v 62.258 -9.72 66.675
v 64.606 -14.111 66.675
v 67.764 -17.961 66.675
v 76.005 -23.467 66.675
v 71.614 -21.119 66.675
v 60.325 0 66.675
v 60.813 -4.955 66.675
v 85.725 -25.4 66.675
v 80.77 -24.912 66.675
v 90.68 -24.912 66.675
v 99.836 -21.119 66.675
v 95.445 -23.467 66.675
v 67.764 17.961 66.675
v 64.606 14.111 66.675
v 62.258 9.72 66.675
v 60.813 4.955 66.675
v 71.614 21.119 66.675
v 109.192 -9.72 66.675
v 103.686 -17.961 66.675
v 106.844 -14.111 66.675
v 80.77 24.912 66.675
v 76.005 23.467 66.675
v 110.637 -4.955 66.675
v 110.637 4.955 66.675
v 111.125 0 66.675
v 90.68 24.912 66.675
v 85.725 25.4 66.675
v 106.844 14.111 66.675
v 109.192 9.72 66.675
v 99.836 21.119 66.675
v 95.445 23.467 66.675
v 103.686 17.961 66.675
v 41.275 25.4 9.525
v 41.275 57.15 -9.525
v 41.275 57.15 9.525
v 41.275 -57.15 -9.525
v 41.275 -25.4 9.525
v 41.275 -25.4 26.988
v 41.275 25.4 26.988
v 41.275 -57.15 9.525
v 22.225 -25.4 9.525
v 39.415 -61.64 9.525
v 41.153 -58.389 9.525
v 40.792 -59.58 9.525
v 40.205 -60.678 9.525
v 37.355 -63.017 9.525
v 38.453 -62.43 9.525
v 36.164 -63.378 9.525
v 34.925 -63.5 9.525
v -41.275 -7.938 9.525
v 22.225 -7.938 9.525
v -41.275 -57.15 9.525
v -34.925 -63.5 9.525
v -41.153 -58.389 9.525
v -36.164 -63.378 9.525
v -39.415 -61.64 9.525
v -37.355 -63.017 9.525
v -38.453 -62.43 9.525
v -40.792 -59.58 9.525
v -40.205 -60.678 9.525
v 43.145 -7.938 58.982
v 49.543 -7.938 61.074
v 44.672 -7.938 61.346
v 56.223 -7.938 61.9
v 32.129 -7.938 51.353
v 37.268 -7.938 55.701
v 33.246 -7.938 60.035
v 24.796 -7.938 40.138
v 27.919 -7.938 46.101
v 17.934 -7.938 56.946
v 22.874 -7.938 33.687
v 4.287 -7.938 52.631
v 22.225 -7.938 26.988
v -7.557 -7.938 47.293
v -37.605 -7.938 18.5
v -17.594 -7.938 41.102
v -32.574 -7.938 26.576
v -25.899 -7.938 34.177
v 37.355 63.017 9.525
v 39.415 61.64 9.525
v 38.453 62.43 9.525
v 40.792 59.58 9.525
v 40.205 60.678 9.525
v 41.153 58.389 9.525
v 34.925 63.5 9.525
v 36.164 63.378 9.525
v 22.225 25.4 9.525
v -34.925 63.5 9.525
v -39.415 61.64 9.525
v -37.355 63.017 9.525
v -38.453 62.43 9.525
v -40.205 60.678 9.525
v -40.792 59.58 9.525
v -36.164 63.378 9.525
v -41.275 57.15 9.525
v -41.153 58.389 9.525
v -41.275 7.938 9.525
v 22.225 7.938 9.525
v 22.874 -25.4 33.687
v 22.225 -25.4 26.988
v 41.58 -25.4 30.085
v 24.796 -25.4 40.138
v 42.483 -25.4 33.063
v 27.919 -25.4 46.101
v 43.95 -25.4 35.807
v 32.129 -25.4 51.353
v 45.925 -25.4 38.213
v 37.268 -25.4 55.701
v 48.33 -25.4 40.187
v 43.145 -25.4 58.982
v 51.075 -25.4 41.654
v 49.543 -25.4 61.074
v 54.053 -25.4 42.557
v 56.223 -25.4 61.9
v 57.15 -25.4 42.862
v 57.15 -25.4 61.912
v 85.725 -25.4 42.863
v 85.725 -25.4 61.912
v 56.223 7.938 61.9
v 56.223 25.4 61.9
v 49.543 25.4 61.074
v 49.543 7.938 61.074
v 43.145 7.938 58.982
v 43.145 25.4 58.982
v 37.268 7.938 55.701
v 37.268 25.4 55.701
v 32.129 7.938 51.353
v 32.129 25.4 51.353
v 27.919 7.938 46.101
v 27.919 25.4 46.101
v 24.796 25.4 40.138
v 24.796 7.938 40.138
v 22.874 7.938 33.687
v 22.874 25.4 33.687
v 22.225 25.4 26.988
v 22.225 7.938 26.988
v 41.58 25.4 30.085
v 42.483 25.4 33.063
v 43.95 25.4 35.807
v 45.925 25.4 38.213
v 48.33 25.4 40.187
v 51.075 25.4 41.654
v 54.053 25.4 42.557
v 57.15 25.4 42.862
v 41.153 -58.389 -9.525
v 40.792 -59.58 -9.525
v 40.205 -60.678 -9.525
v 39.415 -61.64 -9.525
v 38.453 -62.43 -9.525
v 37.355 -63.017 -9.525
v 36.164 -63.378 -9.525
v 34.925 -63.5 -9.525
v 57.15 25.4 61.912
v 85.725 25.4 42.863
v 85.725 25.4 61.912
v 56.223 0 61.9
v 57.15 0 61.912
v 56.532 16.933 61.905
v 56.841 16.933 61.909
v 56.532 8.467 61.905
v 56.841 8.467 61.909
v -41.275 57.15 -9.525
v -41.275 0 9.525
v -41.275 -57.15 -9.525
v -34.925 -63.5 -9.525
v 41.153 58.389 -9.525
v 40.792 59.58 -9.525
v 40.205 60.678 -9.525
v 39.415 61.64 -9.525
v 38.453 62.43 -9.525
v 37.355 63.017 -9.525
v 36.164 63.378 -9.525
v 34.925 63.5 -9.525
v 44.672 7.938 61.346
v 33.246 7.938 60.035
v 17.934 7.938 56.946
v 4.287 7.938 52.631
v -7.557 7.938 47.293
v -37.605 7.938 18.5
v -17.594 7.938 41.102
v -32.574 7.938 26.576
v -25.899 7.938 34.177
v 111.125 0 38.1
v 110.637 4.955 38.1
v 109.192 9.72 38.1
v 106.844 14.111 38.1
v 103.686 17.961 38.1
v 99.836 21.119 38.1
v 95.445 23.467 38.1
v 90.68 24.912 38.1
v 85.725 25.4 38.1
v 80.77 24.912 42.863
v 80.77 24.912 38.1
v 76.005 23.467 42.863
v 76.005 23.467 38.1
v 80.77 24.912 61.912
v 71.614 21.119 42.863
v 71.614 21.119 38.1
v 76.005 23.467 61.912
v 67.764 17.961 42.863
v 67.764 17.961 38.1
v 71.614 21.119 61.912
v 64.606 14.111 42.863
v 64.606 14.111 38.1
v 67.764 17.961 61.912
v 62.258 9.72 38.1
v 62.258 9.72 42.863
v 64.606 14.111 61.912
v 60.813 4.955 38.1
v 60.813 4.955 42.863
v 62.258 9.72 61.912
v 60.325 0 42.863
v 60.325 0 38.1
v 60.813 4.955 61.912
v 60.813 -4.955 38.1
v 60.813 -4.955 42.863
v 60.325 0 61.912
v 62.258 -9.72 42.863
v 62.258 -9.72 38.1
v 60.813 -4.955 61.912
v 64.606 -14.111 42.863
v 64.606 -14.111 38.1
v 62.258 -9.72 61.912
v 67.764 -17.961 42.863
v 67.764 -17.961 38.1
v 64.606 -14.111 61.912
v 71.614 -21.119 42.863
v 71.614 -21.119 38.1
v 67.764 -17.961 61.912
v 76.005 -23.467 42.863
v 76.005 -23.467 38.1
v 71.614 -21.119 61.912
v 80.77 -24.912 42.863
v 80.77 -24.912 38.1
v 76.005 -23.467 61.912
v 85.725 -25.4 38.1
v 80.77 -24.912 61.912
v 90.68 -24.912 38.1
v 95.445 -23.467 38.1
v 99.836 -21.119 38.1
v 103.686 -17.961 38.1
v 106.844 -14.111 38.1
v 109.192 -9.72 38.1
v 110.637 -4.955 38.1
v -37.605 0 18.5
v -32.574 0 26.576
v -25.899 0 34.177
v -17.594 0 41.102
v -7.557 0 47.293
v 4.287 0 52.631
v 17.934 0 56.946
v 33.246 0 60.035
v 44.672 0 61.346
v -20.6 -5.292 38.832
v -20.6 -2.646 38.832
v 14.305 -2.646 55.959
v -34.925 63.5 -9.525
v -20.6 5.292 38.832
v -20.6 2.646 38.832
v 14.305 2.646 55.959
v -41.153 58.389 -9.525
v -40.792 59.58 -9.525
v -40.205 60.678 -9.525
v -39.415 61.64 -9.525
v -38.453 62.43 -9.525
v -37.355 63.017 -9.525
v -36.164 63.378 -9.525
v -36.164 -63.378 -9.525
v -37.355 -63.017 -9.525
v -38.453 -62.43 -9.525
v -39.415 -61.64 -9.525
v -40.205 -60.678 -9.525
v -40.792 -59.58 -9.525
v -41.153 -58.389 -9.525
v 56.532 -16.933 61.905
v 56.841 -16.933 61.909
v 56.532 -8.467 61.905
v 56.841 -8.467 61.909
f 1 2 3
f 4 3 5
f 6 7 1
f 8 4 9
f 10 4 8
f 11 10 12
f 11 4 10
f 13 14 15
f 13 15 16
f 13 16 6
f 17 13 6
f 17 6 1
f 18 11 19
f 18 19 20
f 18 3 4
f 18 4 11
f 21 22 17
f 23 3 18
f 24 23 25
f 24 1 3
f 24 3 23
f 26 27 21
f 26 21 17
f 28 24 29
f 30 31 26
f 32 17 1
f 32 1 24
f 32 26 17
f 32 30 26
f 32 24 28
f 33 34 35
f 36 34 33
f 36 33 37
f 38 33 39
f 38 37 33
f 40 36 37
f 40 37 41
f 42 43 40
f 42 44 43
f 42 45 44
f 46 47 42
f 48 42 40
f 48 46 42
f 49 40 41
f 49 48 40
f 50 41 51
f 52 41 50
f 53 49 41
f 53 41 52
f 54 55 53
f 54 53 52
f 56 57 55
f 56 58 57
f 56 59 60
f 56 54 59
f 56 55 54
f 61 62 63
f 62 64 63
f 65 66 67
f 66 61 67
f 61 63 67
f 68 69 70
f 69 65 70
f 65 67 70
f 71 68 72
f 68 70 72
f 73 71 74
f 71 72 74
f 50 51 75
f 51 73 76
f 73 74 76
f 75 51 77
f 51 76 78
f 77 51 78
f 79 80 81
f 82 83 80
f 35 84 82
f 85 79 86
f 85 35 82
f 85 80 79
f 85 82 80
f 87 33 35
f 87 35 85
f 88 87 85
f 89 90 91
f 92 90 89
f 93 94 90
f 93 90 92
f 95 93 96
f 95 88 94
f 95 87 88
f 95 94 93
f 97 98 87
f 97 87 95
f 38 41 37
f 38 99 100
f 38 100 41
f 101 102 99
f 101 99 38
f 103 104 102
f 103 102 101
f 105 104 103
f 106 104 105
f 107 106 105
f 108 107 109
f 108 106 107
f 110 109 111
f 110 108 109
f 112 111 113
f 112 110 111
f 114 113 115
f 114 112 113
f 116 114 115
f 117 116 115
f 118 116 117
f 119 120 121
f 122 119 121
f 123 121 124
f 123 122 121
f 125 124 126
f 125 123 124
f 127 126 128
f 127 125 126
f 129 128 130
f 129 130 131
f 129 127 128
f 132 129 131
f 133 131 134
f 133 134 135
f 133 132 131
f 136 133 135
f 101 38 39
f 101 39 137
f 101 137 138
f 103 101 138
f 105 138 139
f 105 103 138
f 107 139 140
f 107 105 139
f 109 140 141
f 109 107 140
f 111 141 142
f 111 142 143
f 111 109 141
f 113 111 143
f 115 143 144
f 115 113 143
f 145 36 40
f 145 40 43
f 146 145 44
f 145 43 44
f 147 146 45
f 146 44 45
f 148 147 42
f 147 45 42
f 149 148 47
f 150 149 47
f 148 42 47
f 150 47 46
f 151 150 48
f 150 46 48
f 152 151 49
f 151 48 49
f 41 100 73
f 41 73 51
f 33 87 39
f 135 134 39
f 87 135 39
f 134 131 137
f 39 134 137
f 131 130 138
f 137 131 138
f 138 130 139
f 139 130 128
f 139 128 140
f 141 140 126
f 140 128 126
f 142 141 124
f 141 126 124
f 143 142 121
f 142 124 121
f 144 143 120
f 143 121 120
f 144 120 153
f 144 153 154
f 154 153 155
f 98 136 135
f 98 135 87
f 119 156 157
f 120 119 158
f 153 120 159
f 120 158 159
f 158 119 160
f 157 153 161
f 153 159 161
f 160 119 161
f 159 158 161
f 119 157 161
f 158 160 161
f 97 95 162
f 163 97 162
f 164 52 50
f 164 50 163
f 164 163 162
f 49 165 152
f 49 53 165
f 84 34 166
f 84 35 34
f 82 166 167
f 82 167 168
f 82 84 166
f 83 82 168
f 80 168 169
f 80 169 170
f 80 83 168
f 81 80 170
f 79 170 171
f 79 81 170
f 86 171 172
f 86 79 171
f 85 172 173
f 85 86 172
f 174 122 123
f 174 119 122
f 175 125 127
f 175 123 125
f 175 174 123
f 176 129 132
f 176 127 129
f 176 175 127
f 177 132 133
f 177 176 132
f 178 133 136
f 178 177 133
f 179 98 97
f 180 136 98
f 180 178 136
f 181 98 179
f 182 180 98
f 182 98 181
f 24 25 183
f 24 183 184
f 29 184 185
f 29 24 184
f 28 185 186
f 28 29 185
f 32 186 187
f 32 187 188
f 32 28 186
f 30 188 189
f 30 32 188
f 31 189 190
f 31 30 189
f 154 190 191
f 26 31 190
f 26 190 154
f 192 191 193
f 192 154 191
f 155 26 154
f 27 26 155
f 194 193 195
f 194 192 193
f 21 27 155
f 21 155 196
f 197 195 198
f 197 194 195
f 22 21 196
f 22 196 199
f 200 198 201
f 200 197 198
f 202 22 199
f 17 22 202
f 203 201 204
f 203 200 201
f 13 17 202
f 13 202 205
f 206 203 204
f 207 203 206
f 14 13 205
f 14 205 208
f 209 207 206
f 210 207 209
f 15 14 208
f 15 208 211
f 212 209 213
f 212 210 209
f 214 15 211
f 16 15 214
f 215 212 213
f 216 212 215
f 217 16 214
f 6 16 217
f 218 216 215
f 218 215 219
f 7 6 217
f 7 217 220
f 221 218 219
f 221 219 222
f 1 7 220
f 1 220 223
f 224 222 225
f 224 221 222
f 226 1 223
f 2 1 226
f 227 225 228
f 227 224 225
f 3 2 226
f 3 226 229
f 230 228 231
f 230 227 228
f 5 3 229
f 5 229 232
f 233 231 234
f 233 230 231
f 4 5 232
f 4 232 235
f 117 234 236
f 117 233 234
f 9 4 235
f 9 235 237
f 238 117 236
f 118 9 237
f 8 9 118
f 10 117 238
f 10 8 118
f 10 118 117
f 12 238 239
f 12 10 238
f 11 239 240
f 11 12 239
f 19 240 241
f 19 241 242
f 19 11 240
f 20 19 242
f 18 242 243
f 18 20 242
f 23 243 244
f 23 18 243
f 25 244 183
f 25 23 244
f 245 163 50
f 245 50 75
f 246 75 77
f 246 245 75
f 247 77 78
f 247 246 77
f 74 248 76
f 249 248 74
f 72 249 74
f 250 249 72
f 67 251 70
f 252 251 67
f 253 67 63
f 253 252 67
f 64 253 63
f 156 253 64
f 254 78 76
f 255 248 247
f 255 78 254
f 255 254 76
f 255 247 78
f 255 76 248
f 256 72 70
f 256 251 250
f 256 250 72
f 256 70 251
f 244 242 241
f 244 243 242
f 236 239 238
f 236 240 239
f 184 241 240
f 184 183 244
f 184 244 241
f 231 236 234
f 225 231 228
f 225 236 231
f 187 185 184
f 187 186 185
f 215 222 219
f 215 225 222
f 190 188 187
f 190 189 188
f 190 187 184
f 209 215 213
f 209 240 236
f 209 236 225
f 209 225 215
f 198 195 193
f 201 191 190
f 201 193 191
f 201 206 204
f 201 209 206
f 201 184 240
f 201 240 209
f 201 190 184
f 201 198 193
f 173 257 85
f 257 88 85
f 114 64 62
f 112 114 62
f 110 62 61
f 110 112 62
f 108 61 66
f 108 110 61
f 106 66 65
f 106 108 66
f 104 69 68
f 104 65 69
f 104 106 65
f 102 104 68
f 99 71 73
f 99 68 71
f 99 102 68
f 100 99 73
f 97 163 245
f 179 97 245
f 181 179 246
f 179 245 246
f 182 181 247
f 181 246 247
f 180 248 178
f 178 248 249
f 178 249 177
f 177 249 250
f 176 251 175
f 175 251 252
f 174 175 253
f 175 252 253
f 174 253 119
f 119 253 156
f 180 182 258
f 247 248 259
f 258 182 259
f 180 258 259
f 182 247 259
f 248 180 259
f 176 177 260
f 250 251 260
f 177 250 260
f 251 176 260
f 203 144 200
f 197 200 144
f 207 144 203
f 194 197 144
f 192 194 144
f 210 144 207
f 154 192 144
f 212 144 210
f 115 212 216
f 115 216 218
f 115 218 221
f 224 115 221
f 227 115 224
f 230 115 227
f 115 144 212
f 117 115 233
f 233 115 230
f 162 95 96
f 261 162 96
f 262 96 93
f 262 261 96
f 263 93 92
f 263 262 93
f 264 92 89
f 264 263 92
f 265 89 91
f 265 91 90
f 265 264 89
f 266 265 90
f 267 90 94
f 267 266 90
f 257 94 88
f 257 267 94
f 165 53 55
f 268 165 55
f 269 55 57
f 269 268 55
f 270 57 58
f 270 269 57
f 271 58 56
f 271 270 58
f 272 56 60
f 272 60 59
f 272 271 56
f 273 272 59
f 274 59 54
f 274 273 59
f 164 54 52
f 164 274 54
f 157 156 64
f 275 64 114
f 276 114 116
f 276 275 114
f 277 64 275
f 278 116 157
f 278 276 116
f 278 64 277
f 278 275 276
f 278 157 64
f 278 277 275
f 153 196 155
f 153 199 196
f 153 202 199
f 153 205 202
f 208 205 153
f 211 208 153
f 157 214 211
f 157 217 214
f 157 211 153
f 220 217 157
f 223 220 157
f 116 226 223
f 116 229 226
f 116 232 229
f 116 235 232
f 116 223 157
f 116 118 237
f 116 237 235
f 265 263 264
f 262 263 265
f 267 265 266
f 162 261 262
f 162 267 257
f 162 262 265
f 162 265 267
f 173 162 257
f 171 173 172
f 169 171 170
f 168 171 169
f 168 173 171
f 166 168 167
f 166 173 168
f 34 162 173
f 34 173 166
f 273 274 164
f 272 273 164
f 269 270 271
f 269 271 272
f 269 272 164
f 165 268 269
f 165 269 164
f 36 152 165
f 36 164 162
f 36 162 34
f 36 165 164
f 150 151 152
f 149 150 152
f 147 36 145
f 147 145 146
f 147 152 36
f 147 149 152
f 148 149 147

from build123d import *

# Parameters (mm, degrees)
F1_DEPTH = 63.5
F0_W     = 25.4
F0_H     = 19.05
F2_DEPTH = 25.4
F3_DEPTH = 7.9375
F5_R     = 6.35


with BuildPart() as f1:
    # F0 (on Front) → F1 (new body, symmetric)
    with BuildSketch(Plane.XZ):
        Polygon((-41.275, -9.525), (41.275, -9.525), (41.275, 9.525), (22.225, 9.525), (-41.275, 9.525), align=None)
    extrude(amount=F1_DEPTH, both=True)



with BuildPart() as f2:
    # F0 (on Front) → F2 (new body, symmetric)
    with BuildSketch(Plane.XZ):
        with BuildLine():
            Line((22.225, 9.525), (41.275, 9.525))
            Line((41.275, 9.525), (41.275, 26.9875))
            ThreePointArc((41.275, 26.9875), (45.9246798487, 38.2128201513), (57.15, 42.8625))
            Line((57.15, 42.8625), (60.325, 42.8625))
            Line((60.325, 42.8625), (60.325, 61.9125))
            Line((60.325, 61.9125), (57.15, 61.9125))
            add(Edge.make_bspline(
                [(56.2230819512, 61.9001975172), (56.5320743429, 61.9050863843), (56.8410510368, 61.9091866589), (57.15, 61.9125)],
                knots=[110.7034248849, 110.7034248849, 110.7034248849, 110.7034248849, 111.4985685166, 111.4985685166, 111.4985685166, 111.4985685166], degree=3))
            ThreePointArc((56.2230819512, 61.9001975172), (32.1287266725, 51.3532855624), (22.225, 26.9875))
            Line((22.225, 26.9875), (22.225, 9.525))
        make_face()
        with Locations((73.025, 52.3875)):
            Rectangle(F0_W, F0_H)
    extrude(amount=F2_DEPTH, both=True)


with BuildPart() as f1_1:
    add(f1.part)

    add(f2.part)  # F3 merges F2
    # F0 (on Front) → F3 (join, symmetric)
    with BuildSketch(Plane.XZ):
        with BuildLine():
            add(Edge.make_bspline(
                [(-41.275, 9.525), (-30.1197790598, 45.2532624962), (13.2037900148, 61.219547757), (56.2230819512, 61.9001975172)],
                knots=[0, 0, 0, 0, 110.7034248849, 110.7034248849, 110.7034248849, 110.7034248849], degree=3))
            Line((-41.275, 9.525), (22.225, 9.525))
            Line((22.225, 9.525), (22.225, 26.9875))
            ThreePointArc((22.225, 26.9875), (32.1287266725, 51.3532855624), (56.2230819512, 61.9001975172))
        make_face()
    extrude(amount=F3_DEPTH, both=True)

    # F0 (on Front) → F4 (revolve)
    with BuildSketch(Plane.XZ):
        Polygon((85.725, 61.9125), (85.725, 42.8625), (85.725, 38.1), (111.125, 38.1), (111.125, 66.675), (85.725, 66.675), align=None)
    revolve(axis=Axis((85.725, 0, 52.3875), (0, 0, 1)))

    # F5
    f5_edges = [f1_1.edges().sort_by_distance(p)[0] for p in [
        (-41.275, -63.5, 0),
        (41.275, -63.5, 0),
        (41.275, 63.5, 0),
        (-41.275, 63.5, 0),
    ]]
    fillet(f5_edges, radius=F5_R)


solid = f1_1.part
